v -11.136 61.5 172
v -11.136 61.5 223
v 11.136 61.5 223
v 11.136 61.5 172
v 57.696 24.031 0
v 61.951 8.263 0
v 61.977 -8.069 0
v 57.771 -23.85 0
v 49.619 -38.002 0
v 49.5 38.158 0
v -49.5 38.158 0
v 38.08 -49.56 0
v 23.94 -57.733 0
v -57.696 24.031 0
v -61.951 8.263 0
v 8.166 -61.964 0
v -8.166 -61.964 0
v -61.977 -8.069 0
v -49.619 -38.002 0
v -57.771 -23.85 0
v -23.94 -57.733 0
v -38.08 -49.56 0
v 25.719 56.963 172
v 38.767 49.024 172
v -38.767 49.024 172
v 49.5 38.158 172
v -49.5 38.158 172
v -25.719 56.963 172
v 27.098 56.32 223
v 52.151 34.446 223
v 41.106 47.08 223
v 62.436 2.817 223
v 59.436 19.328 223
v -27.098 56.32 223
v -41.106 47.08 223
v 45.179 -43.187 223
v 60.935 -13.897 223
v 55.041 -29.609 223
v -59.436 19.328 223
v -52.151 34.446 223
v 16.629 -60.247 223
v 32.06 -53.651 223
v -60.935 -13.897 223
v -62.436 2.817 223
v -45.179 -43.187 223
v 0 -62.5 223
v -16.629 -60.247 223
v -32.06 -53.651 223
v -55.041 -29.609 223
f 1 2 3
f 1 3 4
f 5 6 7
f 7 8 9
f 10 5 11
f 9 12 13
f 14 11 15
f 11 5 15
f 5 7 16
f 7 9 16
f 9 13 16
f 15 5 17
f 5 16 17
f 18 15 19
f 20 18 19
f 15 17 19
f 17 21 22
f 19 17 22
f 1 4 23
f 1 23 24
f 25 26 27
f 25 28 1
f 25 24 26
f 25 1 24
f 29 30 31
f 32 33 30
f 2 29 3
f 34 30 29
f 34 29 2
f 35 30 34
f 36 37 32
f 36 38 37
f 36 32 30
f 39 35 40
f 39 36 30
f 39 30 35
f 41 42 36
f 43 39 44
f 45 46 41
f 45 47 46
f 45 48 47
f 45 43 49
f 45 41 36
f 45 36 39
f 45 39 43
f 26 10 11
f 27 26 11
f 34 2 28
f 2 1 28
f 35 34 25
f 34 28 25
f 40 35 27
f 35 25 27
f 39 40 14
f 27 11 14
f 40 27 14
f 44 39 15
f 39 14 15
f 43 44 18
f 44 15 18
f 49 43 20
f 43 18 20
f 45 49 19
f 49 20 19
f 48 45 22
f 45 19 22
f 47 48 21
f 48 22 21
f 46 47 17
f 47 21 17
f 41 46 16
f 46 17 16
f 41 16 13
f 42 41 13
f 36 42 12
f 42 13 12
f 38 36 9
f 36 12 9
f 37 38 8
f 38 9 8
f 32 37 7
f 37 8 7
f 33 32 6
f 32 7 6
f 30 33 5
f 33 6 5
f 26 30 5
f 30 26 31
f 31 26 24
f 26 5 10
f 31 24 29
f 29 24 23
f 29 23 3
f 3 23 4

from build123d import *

# Parameters (mm, degrees)
SKETCH1_R               = 62.5
BOSS_EXTRUDE3_DEPTH     = 223
CUT_EXTRUDE1_DEPTH      = 240.878094039
CUT_EXTRUDE1_DEPTH_BACK = 172
SKETCH3_W               = 51
SKETCH3_H               = 1
CUT_EXTRUDE2_DEPTH      = 174


with BuildPart() as part:
    # Sketch1 → Boss-Extrude3 (new body)
    with BuildSketch(Plane.XY):
        with Locations(Location((0, 0, 0), (0, 0, 180))):
            Circle(SKETCH1_R)
    extrude(amount=BOSS_EXTRUDE3_DEPTH)

    # Sketch2 → Cut-Extrude1 (cut, two sides: drawn at the far end of the back side and taken through both)
    with BuildSketch(Plane(origin=(0, 0, 0), x_dir=(-1, 0, 0), z_dir=(0, 0, -1)).offset(-CUT_EXTRUDE1_DEPTH_BACK)):
        Polygon((-360.670689192, 38.157568057), (-49.5, 38.157568057), (49.5, 38.157568057), (360.670689192, 38.157568057), (360.670689192, 660.498946441), (-360.670689192, 660.498946441), align=None)
    extrude(amount=CUT_EXTRUDE1_DEPTH + CUT_EXTRUDE1_DEPTH_BACK, mode=Mode.SUBTRACT)

    # Sketch3 → Cut-Extrude2 (cut)
    with BuildSketch(Plane(origin=(-62.5, 0, 0), x_dir=(0, 0, -1), z_dir=(1, 0, 0))):
        with Locations((-197.5, 62)):
            Rectangle(SKETCH3_W, SKETCH3_H)
    extrude(amount=CUT_EXTRUDE2_DEPTH, mode=Mode.SUBTRACT)


solid = part.part
